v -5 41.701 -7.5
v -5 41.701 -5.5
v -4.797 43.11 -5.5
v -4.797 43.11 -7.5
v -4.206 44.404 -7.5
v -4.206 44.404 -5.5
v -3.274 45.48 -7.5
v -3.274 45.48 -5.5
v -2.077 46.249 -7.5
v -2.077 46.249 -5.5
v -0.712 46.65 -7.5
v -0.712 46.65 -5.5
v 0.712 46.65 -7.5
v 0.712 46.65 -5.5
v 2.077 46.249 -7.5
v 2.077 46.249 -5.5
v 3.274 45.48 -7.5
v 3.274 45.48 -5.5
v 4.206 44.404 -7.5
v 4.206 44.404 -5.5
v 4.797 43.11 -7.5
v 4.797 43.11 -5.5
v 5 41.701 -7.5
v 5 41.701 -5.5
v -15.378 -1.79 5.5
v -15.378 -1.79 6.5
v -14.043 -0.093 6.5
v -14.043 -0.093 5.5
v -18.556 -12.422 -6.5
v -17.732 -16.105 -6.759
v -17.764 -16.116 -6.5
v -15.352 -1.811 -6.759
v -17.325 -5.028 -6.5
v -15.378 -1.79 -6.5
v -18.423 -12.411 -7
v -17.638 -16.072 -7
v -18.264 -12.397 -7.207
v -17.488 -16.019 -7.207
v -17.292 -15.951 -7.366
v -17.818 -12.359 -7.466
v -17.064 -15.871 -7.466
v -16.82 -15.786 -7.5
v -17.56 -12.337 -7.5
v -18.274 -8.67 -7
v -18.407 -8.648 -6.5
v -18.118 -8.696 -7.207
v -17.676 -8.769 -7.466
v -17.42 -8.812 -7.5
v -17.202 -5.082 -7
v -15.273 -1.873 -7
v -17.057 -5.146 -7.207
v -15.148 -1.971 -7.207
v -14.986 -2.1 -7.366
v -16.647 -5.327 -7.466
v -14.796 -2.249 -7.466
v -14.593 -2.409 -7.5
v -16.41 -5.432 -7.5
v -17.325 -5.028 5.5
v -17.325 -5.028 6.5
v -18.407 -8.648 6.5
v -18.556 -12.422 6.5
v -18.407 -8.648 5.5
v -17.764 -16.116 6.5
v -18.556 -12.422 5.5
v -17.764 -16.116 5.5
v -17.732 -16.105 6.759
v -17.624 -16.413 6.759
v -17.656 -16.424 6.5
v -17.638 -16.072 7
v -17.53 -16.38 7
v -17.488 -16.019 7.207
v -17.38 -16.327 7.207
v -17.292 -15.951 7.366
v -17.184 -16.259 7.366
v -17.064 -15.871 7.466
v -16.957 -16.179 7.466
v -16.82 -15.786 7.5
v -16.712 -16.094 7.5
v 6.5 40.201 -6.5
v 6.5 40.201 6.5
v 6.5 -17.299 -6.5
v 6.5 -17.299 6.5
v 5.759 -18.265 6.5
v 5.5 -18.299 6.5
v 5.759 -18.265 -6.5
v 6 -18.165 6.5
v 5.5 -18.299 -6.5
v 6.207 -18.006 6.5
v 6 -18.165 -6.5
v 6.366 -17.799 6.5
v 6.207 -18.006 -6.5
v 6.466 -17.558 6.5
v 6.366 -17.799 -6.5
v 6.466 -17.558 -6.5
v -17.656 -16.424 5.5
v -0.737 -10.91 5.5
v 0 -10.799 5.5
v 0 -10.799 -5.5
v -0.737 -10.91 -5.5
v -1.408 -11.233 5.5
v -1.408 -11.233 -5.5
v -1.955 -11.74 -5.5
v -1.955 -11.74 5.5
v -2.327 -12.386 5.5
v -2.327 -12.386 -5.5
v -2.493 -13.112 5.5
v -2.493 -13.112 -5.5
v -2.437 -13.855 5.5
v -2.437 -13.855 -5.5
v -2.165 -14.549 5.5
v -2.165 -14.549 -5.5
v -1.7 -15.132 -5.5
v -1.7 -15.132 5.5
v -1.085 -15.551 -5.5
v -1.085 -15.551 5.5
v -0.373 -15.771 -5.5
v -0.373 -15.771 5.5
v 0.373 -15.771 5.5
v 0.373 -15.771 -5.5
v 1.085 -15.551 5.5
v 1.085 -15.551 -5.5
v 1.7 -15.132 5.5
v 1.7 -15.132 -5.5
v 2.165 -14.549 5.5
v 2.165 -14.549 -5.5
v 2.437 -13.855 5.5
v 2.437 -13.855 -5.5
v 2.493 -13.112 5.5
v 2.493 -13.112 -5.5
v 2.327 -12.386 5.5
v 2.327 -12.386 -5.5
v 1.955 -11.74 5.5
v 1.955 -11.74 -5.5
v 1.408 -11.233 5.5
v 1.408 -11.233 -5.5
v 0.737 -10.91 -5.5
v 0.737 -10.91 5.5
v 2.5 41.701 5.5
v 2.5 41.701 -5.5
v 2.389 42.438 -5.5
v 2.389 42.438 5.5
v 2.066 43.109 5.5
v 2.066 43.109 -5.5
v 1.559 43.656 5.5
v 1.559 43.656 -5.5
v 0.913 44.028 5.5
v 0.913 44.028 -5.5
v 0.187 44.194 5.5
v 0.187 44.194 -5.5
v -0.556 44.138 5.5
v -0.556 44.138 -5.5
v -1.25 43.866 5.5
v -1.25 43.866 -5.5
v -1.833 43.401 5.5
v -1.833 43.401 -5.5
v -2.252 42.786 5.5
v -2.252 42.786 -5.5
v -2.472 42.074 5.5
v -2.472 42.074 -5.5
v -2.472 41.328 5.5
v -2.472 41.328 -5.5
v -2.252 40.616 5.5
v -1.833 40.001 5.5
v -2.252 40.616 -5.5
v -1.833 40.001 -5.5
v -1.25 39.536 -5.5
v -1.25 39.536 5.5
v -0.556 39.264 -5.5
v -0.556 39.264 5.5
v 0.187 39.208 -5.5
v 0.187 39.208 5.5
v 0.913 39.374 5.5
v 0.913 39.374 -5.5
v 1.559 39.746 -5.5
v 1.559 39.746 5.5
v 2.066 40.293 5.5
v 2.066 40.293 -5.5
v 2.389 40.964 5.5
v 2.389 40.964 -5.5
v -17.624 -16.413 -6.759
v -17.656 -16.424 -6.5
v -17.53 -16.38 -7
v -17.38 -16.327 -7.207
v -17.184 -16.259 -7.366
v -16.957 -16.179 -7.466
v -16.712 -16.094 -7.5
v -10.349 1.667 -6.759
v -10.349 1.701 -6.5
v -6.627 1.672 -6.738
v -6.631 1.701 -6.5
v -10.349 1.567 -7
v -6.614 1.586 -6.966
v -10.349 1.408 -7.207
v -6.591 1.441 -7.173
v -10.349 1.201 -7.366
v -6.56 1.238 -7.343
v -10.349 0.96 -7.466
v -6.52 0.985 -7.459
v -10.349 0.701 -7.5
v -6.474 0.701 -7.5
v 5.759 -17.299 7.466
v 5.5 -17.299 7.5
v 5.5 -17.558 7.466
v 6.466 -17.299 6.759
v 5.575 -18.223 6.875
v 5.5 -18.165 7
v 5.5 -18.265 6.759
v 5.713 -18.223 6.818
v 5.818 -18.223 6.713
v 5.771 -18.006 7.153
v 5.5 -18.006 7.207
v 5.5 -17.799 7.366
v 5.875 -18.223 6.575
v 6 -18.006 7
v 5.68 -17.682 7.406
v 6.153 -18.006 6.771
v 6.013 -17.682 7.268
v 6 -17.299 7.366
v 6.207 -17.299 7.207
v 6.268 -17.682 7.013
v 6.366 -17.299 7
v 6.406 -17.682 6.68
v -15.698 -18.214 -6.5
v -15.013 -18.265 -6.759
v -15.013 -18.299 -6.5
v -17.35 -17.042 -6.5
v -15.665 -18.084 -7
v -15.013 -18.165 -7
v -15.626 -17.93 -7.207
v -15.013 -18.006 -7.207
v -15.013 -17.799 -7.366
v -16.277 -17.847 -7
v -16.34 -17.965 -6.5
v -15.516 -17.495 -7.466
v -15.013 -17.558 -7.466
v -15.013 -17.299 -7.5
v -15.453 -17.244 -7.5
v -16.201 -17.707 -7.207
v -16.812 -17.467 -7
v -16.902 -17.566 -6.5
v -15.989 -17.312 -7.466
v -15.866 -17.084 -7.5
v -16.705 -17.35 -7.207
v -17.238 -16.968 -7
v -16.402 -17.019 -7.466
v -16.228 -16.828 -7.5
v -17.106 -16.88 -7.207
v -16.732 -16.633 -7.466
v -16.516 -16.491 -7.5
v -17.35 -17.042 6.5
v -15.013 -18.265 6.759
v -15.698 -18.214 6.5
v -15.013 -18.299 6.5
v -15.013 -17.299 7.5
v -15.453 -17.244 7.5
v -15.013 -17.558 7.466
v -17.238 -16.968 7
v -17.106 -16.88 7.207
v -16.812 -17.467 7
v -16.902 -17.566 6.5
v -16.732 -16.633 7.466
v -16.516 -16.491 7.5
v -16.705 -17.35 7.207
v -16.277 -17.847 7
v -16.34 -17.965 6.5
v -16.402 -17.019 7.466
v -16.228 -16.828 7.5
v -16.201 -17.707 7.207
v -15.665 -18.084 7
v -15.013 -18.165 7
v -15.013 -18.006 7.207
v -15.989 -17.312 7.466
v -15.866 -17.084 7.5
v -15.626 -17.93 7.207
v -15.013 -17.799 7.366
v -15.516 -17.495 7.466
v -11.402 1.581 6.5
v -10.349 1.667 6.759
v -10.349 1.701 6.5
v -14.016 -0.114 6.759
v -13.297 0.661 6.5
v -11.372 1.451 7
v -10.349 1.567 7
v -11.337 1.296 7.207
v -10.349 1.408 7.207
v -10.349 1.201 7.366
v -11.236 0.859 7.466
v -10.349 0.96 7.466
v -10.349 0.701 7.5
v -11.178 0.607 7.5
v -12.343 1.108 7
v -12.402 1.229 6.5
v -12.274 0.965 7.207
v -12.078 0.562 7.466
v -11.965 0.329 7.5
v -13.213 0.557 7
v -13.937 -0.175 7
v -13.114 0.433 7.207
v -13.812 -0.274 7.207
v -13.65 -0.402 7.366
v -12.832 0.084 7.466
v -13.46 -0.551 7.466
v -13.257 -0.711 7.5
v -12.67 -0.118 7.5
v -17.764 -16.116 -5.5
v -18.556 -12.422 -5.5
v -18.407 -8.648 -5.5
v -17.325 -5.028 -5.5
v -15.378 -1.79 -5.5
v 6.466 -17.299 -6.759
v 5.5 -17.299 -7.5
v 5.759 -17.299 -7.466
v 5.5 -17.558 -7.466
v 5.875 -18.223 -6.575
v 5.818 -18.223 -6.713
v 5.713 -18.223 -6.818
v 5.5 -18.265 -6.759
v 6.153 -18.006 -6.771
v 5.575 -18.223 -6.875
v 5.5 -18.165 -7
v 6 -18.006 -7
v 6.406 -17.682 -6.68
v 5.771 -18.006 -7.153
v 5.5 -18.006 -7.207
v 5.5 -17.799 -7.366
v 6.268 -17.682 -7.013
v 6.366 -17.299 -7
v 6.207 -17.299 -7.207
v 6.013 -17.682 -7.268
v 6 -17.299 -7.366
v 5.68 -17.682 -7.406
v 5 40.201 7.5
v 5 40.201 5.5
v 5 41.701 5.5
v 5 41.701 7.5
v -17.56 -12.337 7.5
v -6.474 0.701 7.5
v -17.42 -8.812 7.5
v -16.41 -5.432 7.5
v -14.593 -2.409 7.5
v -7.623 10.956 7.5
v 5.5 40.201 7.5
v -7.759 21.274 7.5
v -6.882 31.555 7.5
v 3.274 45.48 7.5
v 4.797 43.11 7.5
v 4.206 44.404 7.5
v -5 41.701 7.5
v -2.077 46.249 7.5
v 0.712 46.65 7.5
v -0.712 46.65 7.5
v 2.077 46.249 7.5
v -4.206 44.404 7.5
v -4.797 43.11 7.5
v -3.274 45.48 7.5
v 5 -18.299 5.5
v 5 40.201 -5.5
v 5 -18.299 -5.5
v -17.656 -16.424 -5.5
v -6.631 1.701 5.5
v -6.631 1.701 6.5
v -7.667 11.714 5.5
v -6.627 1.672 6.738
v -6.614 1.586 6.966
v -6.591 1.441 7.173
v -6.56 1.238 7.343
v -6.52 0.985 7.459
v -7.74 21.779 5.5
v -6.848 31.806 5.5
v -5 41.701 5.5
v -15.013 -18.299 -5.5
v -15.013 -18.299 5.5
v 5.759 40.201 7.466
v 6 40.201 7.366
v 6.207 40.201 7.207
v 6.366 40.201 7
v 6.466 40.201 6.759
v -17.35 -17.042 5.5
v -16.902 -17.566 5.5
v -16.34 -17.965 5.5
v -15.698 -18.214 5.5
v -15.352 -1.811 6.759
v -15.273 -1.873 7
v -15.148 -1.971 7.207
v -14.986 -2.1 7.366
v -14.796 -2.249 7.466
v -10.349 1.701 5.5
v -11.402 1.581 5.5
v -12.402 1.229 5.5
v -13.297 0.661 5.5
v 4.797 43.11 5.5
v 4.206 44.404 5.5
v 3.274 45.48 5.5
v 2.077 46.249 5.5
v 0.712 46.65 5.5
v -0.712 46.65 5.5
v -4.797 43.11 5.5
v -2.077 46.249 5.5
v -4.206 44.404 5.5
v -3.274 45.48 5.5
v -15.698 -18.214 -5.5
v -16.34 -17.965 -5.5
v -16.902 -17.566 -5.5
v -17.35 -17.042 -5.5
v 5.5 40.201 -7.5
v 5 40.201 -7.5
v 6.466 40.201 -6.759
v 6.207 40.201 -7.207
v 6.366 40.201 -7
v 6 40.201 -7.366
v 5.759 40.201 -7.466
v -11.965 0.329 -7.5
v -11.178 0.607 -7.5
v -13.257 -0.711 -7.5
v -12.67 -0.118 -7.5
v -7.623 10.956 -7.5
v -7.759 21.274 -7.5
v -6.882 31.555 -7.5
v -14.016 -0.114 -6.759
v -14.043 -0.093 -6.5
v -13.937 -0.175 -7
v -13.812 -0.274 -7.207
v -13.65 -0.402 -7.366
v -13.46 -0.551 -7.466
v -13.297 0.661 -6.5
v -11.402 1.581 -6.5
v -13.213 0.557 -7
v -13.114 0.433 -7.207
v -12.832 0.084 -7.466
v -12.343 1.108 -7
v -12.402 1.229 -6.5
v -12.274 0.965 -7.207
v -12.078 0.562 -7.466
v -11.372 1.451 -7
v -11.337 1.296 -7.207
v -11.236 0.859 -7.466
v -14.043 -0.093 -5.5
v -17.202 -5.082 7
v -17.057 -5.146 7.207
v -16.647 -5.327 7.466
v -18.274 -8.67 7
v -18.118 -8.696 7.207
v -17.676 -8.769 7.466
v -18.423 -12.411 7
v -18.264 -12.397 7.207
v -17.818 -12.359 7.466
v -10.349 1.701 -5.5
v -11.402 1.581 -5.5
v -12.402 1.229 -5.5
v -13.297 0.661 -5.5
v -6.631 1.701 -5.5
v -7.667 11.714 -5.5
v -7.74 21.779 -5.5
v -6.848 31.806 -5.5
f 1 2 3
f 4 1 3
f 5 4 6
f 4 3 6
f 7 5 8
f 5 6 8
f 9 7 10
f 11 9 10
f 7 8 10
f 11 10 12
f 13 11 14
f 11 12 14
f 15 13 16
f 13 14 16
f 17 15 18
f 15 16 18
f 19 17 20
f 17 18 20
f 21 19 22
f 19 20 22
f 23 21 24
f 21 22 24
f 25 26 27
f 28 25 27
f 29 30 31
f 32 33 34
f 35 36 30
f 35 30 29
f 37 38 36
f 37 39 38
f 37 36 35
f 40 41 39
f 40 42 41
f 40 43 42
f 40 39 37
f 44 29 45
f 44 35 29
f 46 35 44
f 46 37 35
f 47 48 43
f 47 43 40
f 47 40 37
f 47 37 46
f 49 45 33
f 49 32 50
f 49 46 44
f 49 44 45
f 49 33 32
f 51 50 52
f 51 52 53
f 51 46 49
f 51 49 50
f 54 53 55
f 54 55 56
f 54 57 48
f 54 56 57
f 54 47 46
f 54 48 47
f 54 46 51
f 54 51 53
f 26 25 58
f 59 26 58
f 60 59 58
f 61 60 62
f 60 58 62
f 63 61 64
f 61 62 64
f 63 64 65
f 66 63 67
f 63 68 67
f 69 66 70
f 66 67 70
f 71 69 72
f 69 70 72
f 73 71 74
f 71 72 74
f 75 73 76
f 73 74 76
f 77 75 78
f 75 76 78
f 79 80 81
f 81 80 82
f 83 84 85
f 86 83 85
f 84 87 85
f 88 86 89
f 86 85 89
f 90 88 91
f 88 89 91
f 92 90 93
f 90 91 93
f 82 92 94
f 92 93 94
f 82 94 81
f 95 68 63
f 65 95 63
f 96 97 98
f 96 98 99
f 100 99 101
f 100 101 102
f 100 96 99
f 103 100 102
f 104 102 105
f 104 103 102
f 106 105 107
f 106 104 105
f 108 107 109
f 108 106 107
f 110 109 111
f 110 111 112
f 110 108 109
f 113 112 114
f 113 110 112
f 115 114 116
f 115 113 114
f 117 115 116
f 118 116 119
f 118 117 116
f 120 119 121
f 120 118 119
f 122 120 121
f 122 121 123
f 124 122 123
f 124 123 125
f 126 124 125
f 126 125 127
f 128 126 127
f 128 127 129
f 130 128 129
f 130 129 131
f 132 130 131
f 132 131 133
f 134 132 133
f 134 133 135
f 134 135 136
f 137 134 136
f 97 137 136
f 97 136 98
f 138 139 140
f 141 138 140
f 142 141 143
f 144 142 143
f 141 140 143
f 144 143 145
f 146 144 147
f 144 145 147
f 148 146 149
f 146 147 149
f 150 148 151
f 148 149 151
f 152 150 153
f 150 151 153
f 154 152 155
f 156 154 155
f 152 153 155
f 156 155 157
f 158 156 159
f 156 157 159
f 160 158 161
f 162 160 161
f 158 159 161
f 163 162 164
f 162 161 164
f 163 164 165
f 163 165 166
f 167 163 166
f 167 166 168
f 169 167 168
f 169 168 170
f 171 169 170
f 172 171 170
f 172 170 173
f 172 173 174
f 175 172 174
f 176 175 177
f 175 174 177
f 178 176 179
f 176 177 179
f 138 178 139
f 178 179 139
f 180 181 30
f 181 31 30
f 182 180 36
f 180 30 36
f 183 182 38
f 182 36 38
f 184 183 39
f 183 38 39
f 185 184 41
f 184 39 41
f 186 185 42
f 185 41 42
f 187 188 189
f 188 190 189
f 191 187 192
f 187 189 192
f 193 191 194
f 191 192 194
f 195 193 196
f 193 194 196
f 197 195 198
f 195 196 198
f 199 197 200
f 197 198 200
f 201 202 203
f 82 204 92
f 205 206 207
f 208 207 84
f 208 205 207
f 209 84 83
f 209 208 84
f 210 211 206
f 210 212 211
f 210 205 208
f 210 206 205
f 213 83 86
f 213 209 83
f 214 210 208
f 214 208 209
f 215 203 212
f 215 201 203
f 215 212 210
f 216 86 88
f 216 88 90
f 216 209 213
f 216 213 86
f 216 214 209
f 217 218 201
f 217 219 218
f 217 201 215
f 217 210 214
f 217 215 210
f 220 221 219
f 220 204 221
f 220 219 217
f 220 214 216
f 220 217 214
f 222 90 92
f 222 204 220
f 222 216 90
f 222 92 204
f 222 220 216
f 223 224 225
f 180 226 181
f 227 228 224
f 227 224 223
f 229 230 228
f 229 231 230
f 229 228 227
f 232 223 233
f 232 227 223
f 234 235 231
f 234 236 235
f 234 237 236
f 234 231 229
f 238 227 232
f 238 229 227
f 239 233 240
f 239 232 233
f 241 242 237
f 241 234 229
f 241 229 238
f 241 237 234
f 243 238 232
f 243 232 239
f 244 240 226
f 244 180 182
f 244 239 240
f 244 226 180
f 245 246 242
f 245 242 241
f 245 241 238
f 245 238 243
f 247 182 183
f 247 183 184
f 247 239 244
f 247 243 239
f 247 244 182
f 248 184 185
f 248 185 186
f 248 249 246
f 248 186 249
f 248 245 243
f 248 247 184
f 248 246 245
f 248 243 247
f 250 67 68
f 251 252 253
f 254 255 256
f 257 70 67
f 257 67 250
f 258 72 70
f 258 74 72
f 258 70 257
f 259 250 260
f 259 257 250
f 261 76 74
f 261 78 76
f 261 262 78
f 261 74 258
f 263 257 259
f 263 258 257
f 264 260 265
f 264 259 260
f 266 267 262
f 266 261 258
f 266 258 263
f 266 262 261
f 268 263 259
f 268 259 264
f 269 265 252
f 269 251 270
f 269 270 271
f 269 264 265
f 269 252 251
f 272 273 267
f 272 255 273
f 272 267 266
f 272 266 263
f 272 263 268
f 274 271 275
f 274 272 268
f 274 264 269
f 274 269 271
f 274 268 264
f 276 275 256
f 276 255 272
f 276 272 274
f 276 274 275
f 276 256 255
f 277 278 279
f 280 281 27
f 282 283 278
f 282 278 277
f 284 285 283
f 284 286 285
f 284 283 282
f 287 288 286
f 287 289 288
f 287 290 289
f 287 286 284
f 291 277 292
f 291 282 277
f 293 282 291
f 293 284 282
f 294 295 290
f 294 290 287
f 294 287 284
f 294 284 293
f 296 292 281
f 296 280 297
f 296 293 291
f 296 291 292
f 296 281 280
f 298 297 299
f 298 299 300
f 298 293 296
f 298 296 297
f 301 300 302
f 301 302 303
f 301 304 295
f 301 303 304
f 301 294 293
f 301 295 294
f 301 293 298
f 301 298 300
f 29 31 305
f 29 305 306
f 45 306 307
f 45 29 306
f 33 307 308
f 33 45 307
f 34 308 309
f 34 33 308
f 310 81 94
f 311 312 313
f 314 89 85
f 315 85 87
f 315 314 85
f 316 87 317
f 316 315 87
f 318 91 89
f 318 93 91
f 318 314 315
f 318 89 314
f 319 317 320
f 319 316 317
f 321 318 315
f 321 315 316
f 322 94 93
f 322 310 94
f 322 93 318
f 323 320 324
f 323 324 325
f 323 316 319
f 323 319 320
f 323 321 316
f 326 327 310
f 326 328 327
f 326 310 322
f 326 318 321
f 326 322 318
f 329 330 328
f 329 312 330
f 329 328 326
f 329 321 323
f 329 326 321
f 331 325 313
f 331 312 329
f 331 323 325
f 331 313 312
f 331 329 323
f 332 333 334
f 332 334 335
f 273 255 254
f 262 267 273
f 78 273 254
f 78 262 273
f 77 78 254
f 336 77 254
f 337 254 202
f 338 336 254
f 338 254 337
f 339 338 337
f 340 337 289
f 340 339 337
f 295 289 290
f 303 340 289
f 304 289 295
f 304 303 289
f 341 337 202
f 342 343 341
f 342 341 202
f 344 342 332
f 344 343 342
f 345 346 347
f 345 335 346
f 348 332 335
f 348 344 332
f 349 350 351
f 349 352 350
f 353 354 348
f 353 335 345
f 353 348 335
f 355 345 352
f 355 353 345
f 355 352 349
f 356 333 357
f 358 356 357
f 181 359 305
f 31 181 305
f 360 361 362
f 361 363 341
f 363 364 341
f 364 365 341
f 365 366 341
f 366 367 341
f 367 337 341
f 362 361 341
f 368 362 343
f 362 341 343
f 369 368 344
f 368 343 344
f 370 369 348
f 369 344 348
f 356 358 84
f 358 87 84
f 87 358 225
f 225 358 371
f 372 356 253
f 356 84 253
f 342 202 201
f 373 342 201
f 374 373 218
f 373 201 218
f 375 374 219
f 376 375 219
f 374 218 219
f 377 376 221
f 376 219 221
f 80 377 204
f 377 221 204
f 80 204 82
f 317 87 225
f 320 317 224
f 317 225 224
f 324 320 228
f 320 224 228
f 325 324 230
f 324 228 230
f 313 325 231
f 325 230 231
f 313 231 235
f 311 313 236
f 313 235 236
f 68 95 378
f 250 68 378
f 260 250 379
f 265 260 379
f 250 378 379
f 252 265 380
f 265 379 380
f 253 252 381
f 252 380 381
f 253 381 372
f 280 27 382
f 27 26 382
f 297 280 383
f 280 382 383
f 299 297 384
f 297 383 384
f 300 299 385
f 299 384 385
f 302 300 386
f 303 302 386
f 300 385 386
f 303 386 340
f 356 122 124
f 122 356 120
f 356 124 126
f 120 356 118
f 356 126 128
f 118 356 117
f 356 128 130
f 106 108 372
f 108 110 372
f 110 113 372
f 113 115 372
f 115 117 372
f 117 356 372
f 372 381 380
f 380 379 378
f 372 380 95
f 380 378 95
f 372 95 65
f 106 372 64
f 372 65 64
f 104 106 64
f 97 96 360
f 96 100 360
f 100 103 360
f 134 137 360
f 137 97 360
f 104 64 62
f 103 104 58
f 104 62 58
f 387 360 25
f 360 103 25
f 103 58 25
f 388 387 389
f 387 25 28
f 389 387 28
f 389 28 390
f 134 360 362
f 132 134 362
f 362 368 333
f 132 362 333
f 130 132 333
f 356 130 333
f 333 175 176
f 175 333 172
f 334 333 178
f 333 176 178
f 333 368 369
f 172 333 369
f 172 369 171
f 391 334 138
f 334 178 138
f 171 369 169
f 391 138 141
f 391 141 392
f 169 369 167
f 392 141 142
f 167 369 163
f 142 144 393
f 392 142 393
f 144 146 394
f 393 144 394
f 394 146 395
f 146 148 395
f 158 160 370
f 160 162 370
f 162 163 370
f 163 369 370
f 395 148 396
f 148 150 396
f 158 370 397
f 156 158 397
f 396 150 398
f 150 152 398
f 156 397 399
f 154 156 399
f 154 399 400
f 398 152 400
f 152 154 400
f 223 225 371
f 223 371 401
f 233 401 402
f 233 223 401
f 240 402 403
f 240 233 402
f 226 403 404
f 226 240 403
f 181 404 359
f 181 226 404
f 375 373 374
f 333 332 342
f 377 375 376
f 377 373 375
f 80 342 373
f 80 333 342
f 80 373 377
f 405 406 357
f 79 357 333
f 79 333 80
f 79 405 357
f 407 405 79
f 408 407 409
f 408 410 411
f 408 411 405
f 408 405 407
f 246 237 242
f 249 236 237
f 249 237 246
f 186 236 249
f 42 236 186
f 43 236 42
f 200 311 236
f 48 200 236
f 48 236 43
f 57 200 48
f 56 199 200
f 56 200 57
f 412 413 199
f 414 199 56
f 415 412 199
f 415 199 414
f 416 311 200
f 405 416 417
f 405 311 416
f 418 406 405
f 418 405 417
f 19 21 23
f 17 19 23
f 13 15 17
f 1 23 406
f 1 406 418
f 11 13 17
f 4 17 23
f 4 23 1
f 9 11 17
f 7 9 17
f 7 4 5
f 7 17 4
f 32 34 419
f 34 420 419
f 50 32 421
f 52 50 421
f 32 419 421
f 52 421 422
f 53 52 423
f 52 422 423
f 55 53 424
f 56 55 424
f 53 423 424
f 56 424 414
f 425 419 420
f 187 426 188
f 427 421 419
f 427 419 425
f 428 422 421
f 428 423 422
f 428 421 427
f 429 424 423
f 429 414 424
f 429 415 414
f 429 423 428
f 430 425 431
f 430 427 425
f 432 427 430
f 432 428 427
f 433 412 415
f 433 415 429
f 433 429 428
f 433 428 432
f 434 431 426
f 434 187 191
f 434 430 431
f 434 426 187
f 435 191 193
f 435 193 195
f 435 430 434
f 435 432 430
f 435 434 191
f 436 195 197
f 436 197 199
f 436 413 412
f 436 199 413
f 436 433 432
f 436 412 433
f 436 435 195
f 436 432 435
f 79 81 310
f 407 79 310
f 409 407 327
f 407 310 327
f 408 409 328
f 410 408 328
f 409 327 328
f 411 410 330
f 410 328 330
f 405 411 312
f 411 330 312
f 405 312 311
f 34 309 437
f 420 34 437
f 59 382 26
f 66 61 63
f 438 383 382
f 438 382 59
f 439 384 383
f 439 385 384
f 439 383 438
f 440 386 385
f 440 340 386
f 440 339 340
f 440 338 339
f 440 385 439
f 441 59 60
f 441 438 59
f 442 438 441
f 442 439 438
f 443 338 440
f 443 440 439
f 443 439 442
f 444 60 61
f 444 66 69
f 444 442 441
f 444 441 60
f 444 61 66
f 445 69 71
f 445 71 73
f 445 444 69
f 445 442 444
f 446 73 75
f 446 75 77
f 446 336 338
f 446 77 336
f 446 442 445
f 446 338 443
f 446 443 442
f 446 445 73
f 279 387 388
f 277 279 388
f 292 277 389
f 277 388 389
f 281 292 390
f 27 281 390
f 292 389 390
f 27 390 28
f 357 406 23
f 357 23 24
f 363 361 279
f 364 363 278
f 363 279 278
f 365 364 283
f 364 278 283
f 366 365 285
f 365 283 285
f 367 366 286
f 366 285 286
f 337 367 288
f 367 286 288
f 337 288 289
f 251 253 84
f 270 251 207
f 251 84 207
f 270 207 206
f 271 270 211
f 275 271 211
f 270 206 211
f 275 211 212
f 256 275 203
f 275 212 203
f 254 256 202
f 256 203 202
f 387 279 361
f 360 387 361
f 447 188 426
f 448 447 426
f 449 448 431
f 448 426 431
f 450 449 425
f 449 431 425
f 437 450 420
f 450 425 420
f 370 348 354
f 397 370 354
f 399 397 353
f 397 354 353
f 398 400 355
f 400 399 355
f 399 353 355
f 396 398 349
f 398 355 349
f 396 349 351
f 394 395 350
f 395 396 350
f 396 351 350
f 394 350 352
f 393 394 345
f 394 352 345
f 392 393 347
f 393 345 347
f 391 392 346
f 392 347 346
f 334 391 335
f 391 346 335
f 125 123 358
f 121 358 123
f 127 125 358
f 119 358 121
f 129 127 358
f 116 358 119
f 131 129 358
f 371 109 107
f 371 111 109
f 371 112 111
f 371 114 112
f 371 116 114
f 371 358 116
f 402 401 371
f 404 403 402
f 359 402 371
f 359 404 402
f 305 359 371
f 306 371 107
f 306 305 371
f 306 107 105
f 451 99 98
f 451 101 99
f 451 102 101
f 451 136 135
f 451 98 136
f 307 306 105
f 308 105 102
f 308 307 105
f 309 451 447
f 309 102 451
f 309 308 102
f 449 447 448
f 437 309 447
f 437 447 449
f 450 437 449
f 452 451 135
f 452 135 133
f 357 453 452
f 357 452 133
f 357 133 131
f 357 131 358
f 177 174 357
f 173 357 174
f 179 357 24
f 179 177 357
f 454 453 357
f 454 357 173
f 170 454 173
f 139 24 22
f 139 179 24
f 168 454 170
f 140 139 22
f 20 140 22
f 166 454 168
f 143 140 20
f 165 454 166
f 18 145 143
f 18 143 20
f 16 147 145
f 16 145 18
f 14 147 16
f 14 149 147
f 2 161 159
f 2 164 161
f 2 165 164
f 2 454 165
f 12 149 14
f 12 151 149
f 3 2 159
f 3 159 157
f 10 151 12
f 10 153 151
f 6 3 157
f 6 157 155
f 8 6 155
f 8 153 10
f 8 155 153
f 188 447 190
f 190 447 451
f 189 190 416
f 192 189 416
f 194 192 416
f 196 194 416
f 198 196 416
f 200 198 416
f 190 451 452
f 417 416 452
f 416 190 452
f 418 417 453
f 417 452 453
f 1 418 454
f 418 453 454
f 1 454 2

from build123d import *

# Parameters (mm, degrees)
BOSS_EXTRUDE1_DEPTH     = 7.5
CUT_EXTRUDE1_DEPTH      = 5
CUT_EXTRUDE1_DEPTH_BACK = 25
SKETCH3_W               = 11
SKETCH3_H               = 65
SKETCH5_R               = 2.5
BOSS_EXTRUDE3_DEPTH     = 11
SKETCH6_R               = 2.5
BOSS_EXTRUDE4_DEPTH     = 13
FILLET1_R               = 1
FILLET2_R               = 4.7
FILLET3_R               = 15.1
FILLET4_R               = 2.8
FILLET7_R               = 1
CUT_EXTRUDE2_START      = -1.5
CUT_EXTRUDE2_DEPTH      = 1.5


with BuildPart() as part:
    # Sketch1 → Boss-Extrude1 (new, symmetric)
    with BuildSketch(Plane.XY):
        with BuildLine():
            Line((5, 41.700950662), (6.5, 41.700950662))
            Line((6.5, 41.700950662), (6.5, -18.299049338))
            Line((6.5, -18.299049338), (-17, -18.299049338))
            Line((-17, -18.299049338), (-20.5, -8.299049338))
            Line((-20.5, -8.299049338), (-12.631273367, 1.700950662))
            Line((-12.631273367, 1.700950662), (-6.631273367, 1.700950662))
            ThreePointArc((-6.631273367, 1.700950662), (-7.739623811, 21.779414386), (-5, 41.700950662))
            ThreePointArc((-5, 41.700950662), (0, 46.700950662), (5, 41.700950662))
        make_face()
    extrude(amount=BOSS_EXTRUDE1_DEPTH, both=True)

    # Sketch3 → Cut-Extrude1 (cut, two sides: drawn at the far end of the back side and taken through both)
    with BuildSketch(Plane(origin=(0, 0, 0), x_dir=(0, 0, -1), z_dir=(1, 0, 0)).offset(-CUT_EXTRUDE1_DEPTH_BACK)):
        with Locations((0, 14.200950662)):
            Rectangle(SKETCH3_W, SKETCH3_H)
    extrude(amount=CUT_EXTRUDE1_DEPTH + CUT_EXTRUDE1_DEPTH_BACK, mode=Mode.SUBTRACT)

    # Sketch5 → Boss-Extrude3 (add)
    with BuildSketch(Plane.XY.offset(-5.5)):
        with Locations((0, 41.700950662)):
            Circle(SKETCH5_R)
    extrude(amount=BOSS_EXTRUDE3_DEPTH)

    # Sketch6 → Boss-Extrude4 (add)
    with BuildSketch(Plane.XY.offset(7.5)):
        with Locations(Location((0, -13.299049338, 0), (0, 0, 90))):
            Circle(SKETCH6_R)
    extrude(amount=-BOSS_EXTRUDE4_DEPTH)

    # Fillet1
    fillet1_edges = [part.edges().sort_by_distance(p)[0] for p in [
        (6.5, 11.700950662, 7.5),
        (6.5, 11.700950662, -7.5),
    ]]
    fillet(fillet1_edges, radius=FILLET1_R)

    # Fillet2
    fillet2_edges = [part.edges().sort_by_distance(p)[0] for p in [
        (-12.631273367, 1.700950662, 6.5),
        (-12.631273367, 1.700950662, -6.5),
    ]]
    fillet(fillet2_edges, radius=FILLET2_R)

    # Fillet3
    fillet3_edges = [part.edges().sort_by_distance(p)[0] for p in [
        (-20.5, -8.299049338, 6.5),
        (-20.5, -8.299049338, -6.5),
    ]]
    fillet(fillet3_edges, radius=FILLET3_R)

    # Fillet4
    fillet4_edges = [part.edges().sort_by_distance(p)[0] for p in [
        (-17, -18.299049338, 6.5),
        (-17, -18.299049338, -6.5),
    ]]
    fillet(fillet4_edges, radius=FILLET4_R)

    # Fillet7
    fillet7_edges = [part.edges().sort_by_distance(p)[0] for p in [
        (-4.756726593, -18.299049338, -7.5),
        (-4.756726593, -18.299049338, 7.5),
        (-16.633646488, -17.782681021, 7.5),
        (-16.633646488, -17.782681021, -7.5),
        (-8.490130072, 1.700950662, 7.5),
        (6.5, -18.299049338, 0),
        (6.207106781, -18.299049338, 7.207106781),
        (6.207106781, -18.299049338, -7.207106781),
        (-8.490130072, 1.700950662, -7.5),
        (-14.710530592, -0.941480981, 7.5),
        (-12.40202012, 1.22884069, 7.5),
        (-14.710530592, -0.941480981, -7.5),
        (-12.40202012, 1.22884069, -7.5),
        (-17.710124778, -16.2701214, 7.5),
        (-18.406636263, -8.647634431, 7.5),
        (-17.710124778, -16.2701214, -7.5),
        (-18.406636263, -8.647634431, -7.5),
    ]]
    fillet(fillet7_edges, radius=FILLET7_R)

    # Sketch7 → Cut-Extrude2 (cut)
    with BuildSketch(Plane(origin=(0, 41.700950662, 0), x_dir=(1, 0, 0), z_dir=(0, 1, 0)).offset(CUT_EXTRUDE2_START)):
        with BuildLine():
            Line((6.5, -6.5), (6.5, 6.5))
            ThreePointArc((6.5, 6.5), (6.207106781, 7.207106781), (5.5, 7.5))
            Line((5.5, 7.5), (5, 7.5))
            Line((5, 7.5), (5, 5.5))
            Line((5, 5.5), (5, -5.5))
            Line((5, -5.5), (5, -7.5))
            Line((5, -7.5), (5.5, -7.5))
            ThreePointArc((5.5, -7.5), (6.207106781, -7.207106781), (6.5, -6.5))
        make_face()
    extrude(amount=CUT_EXTRUDE2_DEPTH, mode=Mode.SUBTRACT)


solid = part.part
